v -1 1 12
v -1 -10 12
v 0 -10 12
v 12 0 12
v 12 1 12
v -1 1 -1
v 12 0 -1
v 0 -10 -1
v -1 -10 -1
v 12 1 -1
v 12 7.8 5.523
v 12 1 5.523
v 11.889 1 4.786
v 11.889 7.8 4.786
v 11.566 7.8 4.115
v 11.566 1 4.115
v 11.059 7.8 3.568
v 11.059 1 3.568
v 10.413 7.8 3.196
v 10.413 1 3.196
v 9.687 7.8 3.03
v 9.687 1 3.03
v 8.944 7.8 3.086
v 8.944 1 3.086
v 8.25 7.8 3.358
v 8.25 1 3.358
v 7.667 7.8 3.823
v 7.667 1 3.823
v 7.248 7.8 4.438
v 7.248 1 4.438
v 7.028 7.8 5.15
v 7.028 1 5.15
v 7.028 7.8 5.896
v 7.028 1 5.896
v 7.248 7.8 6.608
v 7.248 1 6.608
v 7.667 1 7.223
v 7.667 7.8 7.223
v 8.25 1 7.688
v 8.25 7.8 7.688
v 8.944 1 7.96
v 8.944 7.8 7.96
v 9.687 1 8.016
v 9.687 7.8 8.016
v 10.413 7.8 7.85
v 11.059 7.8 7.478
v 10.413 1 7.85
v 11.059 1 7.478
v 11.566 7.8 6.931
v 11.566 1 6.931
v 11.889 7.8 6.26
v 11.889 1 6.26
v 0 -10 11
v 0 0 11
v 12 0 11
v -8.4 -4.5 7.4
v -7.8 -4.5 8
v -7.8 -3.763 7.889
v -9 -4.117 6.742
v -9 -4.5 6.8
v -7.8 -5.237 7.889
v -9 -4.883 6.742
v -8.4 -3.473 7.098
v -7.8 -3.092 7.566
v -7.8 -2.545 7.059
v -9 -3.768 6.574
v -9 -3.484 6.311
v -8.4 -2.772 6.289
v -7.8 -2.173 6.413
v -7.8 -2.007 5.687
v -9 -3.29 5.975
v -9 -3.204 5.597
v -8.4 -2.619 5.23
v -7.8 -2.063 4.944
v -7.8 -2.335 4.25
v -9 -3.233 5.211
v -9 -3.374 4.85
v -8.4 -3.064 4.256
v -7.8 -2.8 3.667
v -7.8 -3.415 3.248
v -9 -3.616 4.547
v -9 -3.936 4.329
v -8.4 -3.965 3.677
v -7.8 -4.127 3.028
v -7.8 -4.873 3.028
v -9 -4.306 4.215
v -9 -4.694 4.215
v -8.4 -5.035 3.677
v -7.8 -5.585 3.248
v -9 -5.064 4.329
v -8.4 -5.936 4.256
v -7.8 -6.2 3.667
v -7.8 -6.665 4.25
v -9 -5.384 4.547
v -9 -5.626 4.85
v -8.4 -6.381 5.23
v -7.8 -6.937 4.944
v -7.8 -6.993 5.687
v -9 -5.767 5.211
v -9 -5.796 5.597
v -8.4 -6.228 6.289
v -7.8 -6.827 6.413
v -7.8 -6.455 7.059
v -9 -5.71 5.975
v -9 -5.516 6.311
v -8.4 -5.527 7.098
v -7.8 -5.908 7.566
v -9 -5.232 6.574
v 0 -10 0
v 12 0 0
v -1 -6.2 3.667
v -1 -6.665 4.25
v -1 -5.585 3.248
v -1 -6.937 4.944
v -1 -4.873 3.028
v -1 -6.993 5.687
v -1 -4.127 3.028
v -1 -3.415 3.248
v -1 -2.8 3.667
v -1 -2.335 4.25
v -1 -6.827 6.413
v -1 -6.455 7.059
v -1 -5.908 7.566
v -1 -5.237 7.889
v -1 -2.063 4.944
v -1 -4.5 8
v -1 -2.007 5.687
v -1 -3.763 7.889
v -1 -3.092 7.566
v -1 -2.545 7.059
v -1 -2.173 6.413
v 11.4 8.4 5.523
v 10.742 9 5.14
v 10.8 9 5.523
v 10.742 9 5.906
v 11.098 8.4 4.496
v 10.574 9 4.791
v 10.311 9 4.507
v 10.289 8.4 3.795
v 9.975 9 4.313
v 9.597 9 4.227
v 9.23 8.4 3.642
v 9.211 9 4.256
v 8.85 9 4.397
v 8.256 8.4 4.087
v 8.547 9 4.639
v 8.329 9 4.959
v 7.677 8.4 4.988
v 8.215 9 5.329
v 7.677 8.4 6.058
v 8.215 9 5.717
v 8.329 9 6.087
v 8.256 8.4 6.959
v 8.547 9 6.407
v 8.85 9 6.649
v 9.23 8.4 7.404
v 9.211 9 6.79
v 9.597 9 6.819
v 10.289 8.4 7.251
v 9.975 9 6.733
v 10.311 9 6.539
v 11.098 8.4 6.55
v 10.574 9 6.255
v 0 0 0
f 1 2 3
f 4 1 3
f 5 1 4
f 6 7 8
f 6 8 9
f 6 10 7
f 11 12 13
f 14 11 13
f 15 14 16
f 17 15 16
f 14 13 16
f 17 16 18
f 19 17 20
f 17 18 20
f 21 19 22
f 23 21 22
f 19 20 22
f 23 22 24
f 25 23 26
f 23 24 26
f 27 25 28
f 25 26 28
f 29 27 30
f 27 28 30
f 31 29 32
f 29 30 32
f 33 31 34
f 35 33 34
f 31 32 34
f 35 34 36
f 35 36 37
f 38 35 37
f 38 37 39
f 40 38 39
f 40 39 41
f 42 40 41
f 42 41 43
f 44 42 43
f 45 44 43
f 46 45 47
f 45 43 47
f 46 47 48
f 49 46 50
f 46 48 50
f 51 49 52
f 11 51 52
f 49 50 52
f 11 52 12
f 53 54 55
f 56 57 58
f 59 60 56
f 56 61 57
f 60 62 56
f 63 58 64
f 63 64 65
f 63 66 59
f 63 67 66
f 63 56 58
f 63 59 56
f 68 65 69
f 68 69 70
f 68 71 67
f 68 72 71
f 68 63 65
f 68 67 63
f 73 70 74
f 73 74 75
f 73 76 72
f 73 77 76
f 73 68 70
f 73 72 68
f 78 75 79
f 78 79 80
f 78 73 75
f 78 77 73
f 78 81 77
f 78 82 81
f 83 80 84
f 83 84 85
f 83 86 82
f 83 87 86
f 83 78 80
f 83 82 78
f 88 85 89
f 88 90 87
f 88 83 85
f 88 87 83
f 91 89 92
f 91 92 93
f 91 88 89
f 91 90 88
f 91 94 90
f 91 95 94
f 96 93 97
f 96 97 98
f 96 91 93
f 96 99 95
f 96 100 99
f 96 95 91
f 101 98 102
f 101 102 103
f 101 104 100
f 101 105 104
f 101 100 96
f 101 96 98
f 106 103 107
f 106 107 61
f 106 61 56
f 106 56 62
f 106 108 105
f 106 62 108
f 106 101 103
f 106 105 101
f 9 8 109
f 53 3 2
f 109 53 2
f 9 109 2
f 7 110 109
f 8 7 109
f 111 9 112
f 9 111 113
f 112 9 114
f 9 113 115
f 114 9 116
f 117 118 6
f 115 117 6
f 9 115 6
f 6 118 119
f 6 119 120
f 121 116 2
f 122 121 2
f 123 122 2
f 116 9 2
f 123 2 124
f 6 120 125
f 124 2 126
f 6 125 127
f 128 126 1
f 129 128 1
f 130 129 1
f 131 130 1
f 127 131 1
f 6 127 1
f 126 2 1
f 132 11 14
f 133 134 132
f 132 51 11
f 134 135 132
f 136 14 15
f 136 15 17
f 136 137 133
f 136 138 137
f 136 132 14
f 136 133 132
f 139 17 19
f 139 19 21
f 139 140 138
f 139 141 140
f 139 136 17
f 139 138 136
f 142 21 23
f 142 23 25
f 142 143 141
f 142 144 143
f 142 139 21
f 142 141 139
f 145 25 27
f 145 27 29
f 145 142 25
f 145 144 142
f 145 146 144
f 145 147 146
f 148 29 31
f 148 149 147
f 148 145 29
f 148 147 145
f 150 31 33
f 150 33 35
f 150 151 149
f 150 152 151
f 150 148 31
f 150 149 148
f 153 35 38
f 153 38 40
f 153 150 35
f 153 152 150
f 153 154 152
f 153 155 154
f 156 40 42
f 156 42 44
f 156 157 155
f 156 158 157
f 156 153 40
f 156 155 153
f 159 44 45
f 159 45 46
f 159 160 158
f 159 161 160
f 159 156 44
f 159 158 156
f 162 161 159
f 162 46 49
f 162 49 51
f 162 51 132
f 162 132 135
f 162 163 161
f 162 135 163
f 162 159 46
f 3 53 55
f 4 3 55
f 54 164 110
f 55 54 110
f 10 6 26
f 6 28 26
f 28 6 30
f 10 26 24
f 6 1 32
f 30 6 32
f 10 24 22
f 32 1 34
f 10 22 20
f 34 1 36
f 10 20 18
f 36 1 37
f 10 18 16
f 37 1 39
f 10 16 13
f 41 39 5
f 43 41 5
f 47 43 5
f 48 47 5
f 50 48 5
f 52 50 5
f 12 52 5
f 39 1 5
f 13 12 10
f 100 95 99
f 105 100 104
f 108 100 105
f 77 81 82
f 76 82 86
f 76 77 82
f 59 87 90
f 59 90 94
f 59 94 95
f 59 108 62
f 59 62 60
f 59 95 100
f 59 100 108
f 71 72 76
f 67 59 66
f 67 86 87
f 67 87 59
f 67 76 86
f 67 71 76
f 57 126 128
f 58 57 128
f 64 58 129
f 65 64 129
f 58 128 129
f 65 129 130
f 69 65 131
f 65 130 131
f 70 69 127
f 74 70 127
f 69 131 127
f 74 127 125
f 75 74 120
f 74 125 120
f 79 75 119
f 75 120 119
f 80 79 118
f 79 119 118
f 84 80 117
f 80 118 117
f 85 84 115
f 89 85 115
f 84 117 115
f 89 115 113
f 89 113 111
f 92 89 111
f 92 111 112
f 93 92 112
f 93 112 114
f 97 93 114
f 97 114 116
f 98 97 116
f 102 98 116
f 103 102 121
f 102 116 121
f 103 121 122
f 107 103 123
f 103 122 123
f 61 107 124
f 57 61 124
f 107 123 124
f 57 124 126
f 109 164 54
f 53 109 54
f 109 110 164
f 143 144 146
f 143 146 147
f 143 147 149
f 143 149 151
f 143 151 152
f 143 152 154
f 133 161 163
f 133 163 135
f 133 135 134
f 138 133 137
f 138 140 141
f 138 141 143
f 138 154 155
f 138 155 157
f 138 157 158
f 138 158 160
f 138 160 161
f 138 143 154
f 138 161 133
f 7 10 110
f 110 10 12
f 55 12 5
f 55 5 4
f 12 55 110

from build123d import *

# Parameters (mm, degrees)
SKETCH1_W           = 12
SKETCH1_H           = 11
BOSS_EXTRUDE1_DEPTH = 1
SKETCH2_W           = 11
SKETCH2_H           = 11
BOSS_EXTRUDE2_DEPTH = 1
SKETCH3_R           = 2.5
BOSS_EXTRUDE3_DEPTH = 8
CHAMFER1_SIZE       = 1.2
SKETCH4_R           = 2.5
BOSS_EXTRUDE4_DEPTH = 8
CHAMFER2_SIZE       = 1.2
BOSS_EXTRUDE5_DEPTH = 1
BOSS_EXTRUDE6_DEPTH = 1


with BuildPart() as part:
    # Sketch1 → Boss-Extrude1 (new body)
    with BuildSketch(Plane(origin=(0, 0, 0), x_dir=(1, 0, 0), z_dir=(0, 1, 0))):
        with Locations((6, -5.5)):
            Rectangle(SKETCH1_W, SKETCH1_H)
    extrude(amount=BOSS_EXTRUDE1_DEPTH)

    # Sketch2 → Boss-Extrude2 (add)
    with BuildSketch(Plane.ZY):
        with Locations((5.5, -4.5)):
            Rectangle(SKETCH2_W, SKETCH2_H)
    extrude(amount=BOSS_EXTRUDE2_DEPTH)

    # Sketch3 → Boss-Extrude3 (add)
    with BuildSketch(Plane.ZY.offset(1)):
        with Locations((5.5, -4.5)):
            Circle(SKETCH3_R)
    extrude(amount=BOSS_EXTRUDE3_DEPTH)

    # Chamfer1
    chamfer1_edges = [part.edges().sort_by_distance(p)[0] for p in [
        (-9, -4.5, 3),
    ]]
    chamfer(chamfer1_edges, length=CHAMFER1_SIZE)

    # Sketch4 → Boss-Extrude4 (add)
    with BuildSketch(Plane(origin=(0, 1, 0), x_dir=(1, 0, 0), z_dir=(0, 1, 0))):
        with Locations((9.5, -5.523022779)):
            Circle(SKETCH4_R)
    extrude(amount=BOSS_EXTRUDE4_DEPTH)

    # Chamfer2
    chamfer2_edges = [part.edges().sort_by_distance(p)[0] for p in [
        (7, 9, 5.523022779),
    ]]
    chamfer(chamfer2_edges, length=CHAMFER2_SIZE)

    # Sketch5 → Boss-Extrude5 (add)
    with BuildSketch(Plane.XY.offset(11)):
        Polygon((0, -10), (12, 0), (12, 1), (-1, 1), (-1, -10), align=None)
    extrude(amount=BOSS_EXTRUDE5_DEPTH)

    # Sketch6 → Boss-Extrude6 (add)
    with BuildSketch(Plane(origin=(0, 0, 0), x_dir=(-1, 0, 0), z_dir=(0, 0, -1))):
        Polygon((-12, 0), (0, -10), (1, -10), (1, 1), (-12, 1), align=None)
    extrude(amount=BOSS_EXTRUDE6_DEPTH)


solid = part.part
